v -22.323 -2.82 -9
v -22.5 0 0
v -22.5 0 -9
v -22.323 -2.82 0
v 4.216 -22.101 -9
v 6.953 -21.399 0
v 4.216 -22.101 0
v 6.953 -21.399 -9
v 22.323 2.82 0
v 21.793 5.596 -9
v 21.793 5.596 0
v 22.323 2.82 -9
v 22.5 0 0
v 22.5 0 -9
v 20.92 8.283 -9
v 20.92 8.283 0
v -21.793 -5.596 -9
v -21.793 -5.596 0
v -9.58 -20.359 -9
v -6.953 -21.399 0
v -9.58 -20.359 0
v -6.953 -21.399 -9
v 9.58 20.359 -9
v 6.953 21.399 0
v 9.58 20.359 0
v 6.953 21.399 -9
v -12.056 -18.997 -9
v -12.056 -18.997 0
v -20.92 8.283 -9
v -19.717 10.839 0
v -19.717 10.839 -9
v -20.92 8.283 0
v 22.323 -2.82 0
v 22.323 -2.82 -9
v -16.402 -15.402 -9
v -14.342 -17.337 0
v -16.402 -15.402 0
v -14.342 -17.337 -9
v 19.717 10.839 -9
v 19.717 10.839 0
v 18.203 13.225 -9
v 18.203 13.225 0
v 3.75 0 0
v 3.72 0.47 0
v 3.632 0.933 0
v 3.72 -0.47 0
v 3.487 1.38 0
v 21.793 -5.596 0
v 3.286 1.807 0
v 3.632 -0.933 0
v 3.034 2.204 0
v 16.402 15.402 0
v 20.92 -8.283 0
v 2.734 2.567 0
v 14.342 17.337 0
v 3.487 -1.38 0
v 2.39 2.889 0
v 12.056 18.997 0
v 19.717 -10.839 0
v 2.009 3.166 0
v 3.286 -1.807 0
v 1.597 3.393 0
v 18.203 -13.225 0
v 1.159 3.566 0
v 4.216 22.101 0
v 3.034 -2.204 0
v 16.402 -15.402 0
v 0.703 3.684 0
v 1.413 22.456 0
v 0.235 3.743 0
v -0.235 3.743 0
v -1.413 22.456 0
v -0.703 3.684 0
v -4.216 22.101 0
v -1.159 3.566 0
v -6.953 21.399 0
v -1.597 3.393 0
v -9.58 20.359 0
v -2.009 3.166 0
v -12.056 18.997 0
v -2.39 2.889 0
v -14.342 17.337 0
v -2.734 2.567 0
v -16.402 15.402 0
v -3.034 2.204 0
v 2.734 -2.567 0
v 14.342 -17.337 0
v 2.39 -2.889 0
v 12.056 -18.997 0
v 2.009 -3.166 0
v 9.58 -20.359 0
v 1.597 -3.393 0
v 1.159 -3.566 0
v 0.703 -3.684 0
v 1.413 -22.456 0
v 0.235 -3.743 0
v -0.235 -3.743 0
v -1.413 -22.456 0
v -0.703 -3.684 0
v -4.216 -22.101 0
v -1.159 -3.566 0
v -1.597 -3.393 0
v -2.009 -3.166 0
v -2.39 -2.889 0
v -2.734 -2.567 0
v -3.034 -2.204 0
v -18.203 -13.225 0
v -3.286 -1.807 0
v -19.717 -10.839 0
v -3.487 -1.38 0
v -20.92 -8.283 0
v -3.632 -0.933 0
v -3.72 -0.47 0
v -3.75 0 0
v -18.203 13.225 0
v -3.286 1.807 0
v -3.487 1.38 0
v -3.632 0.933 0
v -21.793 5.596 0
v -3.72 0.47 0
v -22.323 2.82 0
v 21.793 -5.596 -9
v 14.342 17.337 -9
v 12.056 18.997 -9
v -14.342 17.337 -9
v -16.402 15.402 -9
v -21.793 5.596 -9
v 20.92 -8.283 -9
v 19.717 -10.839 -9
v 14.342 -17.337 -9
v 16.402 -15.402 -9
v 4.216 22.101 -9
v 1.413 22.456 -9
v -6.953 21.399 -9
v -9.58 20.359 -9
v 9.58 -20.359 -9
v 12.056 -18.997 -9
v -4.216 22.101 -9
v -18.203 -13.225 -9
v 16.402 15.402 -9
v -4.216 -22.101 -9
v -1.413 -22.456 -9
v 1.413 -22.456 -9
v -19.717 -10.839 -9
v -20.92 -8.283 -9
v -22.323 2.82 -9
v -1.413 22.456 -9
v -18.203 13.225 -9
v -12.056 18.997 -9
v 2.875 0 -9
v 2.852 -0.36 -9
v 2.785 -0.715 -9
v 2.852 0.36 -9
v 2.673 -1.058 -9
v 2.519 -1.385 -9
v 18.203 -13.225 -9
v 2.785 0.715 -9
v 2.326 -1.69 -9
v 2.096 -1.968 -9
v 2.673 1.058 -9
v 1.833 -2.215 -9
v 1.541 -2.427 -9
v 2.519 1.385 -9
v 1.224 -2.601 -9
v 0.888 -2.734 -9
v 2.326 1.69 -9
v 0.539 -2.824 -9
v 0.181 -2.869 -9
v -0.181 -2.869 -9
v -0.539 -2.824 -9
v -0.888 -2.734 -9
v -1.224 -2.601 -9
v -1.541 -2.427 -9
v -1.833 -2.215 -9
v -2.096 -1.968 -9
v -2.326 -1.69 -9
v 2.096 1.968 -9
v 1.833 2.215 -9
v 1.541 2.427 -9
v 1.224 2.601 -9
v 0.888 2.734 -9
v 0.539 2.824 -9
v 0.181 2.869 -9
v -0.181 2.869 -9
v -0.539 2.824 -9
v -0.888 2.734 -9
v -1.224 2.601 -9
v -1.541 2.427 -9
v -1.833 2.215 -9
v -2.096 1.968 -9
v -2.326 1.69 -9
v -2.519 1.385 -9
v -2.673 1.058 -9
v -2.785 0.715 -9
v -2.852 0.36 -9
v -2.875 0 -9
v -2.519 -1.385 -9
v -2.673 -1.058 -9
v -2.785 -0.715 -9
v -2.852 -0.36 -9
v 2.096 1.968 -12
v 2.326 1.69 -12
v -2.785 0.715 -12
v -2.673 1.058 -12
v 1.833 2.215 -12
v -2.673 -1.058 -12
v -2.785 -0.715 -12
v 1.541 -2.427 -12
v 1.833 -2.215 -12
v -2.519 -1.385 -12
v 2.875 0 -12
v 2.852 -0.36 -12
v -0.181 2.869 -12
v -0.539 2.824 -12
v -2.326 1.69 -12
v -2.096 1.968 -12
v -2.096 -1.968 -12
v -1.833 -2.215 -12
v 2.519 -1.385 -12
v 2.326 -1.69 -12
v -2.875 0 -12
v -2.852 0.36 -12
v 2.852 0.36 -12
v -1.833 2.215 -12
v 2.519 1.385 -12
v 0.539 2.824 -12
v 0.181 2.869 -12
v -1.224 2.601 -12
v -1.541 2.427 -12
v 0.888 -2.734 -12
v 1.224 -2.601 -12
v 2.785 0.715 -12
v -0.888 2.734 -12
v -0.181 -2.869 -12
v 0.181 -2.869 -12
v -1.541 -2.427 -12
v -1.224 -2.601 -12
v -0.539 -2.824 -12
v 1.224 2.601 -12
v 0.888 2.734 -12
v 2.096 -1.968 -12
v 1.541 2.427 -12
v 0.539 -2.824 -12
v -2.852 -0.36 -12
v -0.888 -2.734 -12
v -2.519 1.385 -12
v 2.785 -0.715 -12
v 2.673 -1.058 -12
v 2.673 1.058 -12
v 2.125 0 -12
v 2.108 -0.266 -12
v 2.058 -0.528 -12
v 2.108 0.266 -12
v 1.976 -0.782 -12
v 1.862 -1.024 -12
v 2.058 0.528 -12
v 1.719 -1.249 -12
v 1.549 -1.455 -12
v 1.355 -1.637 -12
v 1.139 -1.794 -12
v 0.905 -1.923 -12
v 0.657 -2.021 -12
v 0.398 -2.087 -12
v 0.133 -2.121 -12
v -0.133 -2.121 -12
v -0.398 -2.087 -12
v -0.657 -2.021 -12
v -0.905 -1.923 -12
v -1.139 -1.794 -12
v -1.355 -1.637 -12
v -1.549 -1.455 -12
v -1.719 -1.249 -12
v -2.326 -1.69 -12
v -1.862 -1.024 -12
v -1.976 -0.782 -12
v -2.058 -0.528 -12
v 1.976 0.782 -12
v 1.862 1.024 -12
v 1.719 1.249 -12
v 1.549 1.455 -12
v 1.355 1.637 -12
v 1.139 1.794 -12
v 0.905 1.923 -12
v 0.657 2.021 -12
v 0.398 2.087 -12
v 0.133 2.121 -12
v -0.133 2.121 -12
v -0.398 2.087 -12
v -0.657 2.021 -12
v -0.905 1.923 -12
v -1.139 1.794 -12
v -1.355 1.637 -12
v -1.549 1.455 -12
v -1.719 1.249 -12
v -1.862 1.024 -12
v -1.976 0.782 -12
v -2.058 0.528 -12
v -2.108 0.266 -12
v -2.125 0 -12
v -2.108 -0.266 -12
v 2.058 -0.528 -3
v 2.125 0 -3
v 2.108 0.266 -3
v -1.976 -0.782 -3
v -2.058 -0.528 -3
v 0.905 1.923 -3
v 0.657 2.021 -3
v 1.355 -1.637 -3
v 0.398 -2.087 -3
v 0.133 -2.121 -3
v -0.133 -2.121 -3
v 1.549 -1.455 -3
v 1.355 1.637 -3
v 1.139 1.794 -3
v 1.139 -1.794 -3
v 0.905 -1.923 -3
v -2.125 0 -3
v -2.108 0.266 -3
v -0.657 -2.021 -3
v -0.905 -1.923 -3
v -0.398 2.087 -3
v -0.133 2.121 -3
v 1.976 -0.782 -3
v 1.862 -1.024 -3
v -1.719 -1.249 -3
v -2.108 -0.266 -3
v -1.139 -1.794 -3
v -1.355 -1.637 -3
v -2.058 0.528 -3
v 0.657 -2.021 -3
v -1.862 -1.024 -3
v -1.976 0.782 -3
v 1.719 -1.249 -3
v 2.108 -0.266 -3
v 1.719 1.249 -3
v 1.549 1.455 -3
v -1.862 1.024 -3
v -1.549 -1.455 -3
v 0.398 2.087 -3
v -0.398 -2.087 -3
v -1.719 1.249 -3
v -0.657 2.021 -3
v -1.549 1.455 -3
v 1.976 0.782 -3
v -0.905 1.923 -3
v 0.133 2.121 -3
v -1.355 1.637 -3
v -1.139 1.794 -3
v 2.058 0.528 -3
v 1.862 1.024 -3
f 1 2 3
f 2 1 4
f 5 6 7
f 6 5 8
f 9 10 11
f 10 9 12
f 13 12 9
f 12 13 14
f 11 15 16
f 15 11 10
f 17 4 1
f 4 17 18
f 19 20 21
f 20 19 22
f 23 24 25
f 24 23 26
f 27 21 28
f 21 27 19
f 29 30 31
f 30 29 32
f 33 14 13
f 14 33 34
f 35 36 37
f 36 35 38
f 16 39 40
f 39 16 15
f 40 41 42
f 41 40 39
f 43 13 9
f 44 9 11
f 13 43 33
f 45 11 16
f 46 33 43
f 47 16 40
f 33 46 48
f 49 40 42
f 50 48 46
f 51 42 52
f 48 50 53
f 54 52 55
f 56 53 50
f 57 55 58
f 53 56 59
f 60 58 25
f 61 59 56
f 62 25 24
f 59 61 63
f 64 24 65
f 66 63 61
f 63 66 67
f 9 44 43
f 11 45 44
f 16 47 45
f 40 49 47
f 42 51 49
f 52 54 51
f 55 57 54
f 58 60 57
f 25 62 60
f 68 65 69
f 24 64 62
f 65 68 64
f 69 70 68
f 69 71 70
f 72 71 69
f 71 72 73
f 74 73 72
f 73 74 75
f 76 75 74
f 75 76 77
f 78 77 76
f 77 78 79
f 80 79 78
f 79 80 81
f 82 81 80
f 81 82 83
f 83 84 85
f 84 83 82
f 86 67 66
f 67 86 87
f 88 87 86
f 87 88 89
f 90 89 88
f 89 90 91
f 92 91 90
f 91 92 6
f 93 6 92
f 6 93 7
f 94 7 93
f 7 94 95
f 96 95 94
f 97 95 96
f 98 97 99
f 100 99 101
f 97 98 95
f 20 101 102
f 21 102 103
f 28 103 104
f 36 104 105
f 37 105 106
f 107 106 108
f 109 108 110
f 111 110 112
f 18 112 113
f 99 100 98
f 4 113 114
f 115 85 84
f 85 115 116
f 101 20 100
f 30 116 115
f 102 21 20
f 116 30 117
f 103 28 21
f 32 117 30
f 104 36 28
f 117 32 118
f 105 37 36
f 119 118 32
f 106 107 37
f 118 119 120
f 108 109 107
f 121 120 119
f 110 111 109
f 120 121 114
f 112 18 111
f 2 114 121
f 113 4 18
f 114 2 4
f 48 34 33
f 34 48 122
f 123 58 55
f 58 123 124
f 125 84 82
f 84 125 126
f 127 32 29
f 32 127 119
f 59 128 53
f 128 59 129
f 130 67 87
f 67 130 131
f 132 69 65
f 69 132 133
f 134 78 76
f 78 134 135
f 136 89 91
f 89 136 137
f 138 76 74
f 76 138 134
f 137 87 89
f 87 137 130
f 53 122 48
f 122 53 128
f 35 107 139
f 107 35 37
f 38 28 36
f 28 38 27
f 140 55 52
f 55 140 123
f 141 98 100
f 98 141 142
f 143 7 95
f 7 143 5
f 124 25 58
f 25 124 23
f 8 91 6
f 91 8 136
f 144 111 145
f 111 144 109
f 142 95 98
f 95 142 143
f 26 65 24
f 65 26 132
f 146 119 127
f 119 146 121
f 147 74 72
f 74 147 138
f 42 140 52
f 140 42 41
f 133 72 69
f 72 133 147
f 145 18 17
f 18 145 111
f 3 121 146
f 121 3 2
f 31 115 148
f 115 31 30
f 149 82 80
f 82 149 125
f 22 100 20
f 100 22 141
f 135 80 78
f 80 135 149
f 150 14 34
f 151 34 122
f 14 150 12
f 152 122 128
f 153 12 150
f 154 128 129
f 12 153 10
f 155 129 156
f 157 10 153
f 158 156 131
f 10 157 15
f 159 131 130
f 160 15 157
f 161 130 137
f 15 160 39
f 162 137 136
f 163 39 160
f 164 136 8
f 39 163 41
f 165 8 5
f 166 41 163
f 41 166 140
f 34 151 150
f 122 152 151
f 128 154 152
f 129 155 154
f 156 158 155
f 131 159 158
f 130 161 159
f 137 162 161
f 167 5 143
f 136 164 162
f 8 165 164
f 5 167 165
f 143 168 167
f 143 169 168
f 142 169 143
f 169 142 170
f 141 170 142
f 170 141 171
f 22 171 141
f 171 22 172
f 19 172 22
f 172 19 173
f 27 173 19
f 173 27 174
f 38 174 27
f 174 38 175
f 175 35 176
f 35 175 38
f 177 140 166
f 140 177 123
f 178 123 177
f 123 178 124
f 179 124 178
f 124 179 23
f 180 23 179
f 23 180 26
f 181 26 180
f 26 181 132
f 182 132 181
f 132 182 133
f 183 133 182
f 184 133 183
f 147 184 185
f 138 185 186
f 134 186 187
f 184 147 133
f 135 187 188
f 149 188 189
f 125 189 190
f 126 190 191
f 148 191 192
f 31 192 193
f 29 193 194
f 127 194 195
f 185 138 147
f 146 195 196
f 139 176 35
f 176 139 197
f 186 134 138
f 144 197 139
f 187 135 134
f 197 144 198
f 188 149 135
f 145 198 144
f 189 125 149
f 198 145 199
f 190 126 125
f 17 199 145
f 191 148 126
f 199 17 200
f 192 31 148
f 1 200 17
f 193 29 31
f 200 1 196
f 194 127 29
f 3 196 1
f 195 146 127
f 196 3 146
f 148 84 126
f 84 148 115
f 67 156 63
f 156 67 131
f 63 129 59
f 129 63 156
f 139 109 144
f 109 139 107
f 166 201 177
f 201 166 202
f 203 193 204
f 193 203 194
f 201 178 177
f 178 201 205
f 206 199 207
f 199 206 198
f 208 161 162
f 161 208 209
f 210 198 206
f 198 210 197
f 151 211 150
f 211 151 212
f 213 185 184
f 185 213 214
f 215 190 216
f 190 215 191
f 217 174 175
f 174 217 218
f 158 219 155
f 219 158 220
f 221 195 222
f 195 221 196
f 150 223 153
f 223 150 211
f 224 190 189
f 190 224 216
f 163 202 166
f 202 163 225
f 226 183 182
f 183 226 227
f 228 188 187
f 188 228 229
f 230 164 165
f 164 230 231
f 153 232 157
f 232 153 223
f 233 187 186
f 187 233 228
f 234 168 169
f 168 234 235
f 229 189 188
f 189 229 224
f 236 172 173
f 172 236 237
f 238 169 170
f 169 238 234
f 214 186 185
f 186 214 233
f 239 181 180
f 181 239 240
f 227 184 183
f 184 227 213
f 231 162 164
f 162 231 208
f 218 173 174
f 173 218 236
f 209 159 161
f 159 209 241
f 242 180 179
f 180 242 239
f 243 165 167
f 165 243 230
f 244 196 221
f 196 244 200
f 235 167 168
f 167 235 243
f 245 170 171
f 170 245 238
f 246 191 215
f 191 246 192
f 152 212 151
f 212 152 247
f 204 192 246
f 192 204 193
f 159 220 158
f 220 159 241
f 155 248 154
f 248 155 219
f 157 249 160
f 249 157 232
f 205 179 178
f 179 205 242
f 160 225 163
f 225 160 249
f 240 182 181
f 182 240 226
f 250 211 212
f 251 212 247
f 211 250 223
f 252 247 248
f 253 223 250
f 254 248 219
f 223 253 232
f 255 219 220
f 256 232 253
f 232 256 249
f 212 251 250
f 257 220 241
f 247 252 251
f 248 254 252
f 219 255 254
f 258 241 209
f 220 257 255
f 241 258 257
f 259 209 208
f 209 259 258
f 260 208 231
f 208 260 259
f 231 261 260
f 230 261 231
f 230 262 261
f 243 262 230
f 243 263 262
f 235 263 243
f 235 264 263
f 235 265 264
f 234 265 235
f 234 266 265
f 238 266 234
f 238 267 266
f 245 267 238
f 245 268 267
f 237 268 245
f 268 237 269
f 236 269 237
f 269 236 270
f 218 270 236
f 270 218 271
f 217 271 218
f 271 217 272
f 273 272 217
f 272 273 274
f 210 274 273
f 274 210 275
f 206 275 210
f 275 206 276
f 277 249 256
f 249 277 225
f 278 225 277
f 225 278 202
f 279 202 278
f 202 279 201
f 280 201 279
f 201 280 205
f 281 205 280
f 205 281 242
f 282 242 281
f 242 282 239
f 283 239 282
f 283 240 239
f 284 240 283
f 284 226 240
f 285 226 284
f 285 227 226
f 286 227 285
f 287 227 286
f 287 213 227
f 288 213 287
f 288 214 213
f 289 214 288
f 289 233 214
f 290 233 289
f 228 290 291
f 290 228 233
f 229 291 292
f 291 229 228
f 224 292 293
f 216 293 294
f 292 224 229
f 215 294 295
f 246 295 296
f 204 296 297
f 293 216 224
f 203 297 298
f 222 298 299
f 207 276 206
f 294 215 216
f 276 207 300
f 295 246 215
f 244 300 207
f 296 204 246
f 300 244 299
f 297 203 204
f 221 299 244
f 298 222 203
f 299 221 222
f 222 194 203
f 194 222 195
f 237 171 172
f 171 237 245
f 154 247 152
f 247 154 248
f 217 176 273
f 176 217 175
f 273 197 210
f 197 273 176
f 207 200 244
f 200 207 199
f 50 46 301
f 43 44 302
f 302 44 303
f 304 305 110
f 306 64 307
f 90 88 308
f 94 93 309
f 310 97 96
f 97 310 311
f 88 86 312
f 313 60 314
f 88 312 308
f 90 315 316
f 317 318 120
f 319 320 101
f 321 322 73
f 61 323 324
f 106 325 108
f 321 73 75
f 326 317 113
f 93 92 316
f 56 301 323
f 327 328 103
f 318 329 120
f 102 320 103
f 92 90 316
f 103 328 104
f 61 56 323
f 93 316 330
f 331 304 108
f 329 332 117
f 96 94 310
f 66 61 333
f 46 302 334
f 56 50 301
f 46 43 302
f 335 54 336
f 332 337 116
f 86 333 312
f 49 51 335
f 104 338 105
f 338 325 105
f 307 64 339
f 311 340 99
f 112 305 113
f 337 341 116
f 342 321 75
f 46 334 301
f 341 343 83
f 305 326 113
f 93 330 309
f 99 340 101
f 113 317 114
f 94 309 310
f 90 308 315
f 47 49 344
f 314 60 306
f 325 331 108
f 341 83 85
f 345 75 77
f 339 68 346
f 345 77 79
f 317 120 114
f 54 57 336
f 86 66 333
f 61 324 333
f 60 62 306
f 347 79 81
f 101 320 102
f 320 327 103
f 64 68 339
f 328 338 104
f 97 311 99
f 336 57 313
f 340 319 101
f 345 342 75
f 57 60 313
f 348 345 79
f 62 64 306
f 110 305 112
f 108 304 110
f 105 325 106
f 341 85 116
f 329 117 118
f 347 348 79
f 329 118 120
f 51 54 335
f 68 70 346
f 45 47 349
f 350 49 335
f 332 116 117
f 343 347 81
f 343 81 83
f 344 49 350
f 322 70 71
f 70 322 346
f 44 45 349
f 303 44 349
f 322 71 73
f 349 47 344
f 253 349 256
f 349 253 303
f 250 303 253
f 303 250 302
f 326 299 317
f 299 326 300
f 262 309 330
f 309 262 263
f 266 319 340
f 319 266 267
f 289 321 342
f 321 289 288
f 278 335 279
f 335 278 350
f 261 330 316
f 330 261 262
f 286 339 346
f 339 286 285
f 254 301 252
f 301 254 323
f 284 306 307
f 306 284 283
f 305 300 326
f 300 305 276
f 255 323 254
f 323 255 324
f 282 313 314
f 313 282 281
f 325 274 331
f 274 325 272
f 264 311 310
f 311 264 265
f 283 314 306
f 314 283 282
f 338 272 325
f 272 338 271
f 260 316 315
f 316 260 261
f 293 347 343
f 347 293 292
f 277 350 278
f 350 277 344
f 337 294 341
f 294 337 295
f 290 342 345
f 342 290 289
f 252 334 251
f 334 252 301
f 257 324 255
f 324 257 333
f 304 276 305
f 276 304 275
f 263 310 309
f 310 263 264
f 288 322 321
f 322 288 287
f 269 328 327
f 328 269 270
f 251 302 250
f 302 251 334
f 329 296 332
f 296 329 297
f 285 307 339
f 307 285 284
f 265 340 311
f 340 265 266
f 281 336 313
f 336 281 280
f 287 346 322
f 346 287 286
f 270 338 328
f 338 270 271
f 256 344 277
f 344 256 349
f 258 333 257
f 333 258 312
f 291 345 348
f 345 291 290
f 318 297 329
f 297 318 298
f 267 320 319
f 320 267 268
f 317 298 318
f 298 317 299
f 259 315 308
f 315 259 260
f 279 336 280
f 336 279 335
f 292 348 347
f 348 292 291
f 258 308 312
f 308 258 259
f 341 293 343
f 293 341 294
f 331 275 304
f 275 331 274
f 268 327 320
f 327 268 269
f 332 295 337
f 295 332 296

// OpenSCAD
$fn = 50;

difference() {
	union() {
		translate(v = [0, 0, -9.0]) {
			cylinder(h = 9, r = 22.5);
		}
		#translate(v = [0, 0, -12.0]) {
			cylinder(h = 12, r = 2.875);
		}
	}
	union() {
		translate(v = [0, 0, 0]) {
			rotate(a = [0, 0, 0]) {
				difference() {
					union() {
						translate(v = [0, 0, -12.0]) {
							cylinder(h = 12, r = 2.0);
						}
						translate(v = [0, 0, -3]) {
							cylinder(h = 3, r1 = 2.125, r2 = 3.75);
						}
						translate(v = [0, 0, -12.0]) {
							cylinder(h = 12, r = 2.125);
						}
						translate(v = [0, 0, -12.0]) {
							cylinder(h = 12, r = 2.0);
						}
					}
					union();
				}
			}
		}
	}
}
